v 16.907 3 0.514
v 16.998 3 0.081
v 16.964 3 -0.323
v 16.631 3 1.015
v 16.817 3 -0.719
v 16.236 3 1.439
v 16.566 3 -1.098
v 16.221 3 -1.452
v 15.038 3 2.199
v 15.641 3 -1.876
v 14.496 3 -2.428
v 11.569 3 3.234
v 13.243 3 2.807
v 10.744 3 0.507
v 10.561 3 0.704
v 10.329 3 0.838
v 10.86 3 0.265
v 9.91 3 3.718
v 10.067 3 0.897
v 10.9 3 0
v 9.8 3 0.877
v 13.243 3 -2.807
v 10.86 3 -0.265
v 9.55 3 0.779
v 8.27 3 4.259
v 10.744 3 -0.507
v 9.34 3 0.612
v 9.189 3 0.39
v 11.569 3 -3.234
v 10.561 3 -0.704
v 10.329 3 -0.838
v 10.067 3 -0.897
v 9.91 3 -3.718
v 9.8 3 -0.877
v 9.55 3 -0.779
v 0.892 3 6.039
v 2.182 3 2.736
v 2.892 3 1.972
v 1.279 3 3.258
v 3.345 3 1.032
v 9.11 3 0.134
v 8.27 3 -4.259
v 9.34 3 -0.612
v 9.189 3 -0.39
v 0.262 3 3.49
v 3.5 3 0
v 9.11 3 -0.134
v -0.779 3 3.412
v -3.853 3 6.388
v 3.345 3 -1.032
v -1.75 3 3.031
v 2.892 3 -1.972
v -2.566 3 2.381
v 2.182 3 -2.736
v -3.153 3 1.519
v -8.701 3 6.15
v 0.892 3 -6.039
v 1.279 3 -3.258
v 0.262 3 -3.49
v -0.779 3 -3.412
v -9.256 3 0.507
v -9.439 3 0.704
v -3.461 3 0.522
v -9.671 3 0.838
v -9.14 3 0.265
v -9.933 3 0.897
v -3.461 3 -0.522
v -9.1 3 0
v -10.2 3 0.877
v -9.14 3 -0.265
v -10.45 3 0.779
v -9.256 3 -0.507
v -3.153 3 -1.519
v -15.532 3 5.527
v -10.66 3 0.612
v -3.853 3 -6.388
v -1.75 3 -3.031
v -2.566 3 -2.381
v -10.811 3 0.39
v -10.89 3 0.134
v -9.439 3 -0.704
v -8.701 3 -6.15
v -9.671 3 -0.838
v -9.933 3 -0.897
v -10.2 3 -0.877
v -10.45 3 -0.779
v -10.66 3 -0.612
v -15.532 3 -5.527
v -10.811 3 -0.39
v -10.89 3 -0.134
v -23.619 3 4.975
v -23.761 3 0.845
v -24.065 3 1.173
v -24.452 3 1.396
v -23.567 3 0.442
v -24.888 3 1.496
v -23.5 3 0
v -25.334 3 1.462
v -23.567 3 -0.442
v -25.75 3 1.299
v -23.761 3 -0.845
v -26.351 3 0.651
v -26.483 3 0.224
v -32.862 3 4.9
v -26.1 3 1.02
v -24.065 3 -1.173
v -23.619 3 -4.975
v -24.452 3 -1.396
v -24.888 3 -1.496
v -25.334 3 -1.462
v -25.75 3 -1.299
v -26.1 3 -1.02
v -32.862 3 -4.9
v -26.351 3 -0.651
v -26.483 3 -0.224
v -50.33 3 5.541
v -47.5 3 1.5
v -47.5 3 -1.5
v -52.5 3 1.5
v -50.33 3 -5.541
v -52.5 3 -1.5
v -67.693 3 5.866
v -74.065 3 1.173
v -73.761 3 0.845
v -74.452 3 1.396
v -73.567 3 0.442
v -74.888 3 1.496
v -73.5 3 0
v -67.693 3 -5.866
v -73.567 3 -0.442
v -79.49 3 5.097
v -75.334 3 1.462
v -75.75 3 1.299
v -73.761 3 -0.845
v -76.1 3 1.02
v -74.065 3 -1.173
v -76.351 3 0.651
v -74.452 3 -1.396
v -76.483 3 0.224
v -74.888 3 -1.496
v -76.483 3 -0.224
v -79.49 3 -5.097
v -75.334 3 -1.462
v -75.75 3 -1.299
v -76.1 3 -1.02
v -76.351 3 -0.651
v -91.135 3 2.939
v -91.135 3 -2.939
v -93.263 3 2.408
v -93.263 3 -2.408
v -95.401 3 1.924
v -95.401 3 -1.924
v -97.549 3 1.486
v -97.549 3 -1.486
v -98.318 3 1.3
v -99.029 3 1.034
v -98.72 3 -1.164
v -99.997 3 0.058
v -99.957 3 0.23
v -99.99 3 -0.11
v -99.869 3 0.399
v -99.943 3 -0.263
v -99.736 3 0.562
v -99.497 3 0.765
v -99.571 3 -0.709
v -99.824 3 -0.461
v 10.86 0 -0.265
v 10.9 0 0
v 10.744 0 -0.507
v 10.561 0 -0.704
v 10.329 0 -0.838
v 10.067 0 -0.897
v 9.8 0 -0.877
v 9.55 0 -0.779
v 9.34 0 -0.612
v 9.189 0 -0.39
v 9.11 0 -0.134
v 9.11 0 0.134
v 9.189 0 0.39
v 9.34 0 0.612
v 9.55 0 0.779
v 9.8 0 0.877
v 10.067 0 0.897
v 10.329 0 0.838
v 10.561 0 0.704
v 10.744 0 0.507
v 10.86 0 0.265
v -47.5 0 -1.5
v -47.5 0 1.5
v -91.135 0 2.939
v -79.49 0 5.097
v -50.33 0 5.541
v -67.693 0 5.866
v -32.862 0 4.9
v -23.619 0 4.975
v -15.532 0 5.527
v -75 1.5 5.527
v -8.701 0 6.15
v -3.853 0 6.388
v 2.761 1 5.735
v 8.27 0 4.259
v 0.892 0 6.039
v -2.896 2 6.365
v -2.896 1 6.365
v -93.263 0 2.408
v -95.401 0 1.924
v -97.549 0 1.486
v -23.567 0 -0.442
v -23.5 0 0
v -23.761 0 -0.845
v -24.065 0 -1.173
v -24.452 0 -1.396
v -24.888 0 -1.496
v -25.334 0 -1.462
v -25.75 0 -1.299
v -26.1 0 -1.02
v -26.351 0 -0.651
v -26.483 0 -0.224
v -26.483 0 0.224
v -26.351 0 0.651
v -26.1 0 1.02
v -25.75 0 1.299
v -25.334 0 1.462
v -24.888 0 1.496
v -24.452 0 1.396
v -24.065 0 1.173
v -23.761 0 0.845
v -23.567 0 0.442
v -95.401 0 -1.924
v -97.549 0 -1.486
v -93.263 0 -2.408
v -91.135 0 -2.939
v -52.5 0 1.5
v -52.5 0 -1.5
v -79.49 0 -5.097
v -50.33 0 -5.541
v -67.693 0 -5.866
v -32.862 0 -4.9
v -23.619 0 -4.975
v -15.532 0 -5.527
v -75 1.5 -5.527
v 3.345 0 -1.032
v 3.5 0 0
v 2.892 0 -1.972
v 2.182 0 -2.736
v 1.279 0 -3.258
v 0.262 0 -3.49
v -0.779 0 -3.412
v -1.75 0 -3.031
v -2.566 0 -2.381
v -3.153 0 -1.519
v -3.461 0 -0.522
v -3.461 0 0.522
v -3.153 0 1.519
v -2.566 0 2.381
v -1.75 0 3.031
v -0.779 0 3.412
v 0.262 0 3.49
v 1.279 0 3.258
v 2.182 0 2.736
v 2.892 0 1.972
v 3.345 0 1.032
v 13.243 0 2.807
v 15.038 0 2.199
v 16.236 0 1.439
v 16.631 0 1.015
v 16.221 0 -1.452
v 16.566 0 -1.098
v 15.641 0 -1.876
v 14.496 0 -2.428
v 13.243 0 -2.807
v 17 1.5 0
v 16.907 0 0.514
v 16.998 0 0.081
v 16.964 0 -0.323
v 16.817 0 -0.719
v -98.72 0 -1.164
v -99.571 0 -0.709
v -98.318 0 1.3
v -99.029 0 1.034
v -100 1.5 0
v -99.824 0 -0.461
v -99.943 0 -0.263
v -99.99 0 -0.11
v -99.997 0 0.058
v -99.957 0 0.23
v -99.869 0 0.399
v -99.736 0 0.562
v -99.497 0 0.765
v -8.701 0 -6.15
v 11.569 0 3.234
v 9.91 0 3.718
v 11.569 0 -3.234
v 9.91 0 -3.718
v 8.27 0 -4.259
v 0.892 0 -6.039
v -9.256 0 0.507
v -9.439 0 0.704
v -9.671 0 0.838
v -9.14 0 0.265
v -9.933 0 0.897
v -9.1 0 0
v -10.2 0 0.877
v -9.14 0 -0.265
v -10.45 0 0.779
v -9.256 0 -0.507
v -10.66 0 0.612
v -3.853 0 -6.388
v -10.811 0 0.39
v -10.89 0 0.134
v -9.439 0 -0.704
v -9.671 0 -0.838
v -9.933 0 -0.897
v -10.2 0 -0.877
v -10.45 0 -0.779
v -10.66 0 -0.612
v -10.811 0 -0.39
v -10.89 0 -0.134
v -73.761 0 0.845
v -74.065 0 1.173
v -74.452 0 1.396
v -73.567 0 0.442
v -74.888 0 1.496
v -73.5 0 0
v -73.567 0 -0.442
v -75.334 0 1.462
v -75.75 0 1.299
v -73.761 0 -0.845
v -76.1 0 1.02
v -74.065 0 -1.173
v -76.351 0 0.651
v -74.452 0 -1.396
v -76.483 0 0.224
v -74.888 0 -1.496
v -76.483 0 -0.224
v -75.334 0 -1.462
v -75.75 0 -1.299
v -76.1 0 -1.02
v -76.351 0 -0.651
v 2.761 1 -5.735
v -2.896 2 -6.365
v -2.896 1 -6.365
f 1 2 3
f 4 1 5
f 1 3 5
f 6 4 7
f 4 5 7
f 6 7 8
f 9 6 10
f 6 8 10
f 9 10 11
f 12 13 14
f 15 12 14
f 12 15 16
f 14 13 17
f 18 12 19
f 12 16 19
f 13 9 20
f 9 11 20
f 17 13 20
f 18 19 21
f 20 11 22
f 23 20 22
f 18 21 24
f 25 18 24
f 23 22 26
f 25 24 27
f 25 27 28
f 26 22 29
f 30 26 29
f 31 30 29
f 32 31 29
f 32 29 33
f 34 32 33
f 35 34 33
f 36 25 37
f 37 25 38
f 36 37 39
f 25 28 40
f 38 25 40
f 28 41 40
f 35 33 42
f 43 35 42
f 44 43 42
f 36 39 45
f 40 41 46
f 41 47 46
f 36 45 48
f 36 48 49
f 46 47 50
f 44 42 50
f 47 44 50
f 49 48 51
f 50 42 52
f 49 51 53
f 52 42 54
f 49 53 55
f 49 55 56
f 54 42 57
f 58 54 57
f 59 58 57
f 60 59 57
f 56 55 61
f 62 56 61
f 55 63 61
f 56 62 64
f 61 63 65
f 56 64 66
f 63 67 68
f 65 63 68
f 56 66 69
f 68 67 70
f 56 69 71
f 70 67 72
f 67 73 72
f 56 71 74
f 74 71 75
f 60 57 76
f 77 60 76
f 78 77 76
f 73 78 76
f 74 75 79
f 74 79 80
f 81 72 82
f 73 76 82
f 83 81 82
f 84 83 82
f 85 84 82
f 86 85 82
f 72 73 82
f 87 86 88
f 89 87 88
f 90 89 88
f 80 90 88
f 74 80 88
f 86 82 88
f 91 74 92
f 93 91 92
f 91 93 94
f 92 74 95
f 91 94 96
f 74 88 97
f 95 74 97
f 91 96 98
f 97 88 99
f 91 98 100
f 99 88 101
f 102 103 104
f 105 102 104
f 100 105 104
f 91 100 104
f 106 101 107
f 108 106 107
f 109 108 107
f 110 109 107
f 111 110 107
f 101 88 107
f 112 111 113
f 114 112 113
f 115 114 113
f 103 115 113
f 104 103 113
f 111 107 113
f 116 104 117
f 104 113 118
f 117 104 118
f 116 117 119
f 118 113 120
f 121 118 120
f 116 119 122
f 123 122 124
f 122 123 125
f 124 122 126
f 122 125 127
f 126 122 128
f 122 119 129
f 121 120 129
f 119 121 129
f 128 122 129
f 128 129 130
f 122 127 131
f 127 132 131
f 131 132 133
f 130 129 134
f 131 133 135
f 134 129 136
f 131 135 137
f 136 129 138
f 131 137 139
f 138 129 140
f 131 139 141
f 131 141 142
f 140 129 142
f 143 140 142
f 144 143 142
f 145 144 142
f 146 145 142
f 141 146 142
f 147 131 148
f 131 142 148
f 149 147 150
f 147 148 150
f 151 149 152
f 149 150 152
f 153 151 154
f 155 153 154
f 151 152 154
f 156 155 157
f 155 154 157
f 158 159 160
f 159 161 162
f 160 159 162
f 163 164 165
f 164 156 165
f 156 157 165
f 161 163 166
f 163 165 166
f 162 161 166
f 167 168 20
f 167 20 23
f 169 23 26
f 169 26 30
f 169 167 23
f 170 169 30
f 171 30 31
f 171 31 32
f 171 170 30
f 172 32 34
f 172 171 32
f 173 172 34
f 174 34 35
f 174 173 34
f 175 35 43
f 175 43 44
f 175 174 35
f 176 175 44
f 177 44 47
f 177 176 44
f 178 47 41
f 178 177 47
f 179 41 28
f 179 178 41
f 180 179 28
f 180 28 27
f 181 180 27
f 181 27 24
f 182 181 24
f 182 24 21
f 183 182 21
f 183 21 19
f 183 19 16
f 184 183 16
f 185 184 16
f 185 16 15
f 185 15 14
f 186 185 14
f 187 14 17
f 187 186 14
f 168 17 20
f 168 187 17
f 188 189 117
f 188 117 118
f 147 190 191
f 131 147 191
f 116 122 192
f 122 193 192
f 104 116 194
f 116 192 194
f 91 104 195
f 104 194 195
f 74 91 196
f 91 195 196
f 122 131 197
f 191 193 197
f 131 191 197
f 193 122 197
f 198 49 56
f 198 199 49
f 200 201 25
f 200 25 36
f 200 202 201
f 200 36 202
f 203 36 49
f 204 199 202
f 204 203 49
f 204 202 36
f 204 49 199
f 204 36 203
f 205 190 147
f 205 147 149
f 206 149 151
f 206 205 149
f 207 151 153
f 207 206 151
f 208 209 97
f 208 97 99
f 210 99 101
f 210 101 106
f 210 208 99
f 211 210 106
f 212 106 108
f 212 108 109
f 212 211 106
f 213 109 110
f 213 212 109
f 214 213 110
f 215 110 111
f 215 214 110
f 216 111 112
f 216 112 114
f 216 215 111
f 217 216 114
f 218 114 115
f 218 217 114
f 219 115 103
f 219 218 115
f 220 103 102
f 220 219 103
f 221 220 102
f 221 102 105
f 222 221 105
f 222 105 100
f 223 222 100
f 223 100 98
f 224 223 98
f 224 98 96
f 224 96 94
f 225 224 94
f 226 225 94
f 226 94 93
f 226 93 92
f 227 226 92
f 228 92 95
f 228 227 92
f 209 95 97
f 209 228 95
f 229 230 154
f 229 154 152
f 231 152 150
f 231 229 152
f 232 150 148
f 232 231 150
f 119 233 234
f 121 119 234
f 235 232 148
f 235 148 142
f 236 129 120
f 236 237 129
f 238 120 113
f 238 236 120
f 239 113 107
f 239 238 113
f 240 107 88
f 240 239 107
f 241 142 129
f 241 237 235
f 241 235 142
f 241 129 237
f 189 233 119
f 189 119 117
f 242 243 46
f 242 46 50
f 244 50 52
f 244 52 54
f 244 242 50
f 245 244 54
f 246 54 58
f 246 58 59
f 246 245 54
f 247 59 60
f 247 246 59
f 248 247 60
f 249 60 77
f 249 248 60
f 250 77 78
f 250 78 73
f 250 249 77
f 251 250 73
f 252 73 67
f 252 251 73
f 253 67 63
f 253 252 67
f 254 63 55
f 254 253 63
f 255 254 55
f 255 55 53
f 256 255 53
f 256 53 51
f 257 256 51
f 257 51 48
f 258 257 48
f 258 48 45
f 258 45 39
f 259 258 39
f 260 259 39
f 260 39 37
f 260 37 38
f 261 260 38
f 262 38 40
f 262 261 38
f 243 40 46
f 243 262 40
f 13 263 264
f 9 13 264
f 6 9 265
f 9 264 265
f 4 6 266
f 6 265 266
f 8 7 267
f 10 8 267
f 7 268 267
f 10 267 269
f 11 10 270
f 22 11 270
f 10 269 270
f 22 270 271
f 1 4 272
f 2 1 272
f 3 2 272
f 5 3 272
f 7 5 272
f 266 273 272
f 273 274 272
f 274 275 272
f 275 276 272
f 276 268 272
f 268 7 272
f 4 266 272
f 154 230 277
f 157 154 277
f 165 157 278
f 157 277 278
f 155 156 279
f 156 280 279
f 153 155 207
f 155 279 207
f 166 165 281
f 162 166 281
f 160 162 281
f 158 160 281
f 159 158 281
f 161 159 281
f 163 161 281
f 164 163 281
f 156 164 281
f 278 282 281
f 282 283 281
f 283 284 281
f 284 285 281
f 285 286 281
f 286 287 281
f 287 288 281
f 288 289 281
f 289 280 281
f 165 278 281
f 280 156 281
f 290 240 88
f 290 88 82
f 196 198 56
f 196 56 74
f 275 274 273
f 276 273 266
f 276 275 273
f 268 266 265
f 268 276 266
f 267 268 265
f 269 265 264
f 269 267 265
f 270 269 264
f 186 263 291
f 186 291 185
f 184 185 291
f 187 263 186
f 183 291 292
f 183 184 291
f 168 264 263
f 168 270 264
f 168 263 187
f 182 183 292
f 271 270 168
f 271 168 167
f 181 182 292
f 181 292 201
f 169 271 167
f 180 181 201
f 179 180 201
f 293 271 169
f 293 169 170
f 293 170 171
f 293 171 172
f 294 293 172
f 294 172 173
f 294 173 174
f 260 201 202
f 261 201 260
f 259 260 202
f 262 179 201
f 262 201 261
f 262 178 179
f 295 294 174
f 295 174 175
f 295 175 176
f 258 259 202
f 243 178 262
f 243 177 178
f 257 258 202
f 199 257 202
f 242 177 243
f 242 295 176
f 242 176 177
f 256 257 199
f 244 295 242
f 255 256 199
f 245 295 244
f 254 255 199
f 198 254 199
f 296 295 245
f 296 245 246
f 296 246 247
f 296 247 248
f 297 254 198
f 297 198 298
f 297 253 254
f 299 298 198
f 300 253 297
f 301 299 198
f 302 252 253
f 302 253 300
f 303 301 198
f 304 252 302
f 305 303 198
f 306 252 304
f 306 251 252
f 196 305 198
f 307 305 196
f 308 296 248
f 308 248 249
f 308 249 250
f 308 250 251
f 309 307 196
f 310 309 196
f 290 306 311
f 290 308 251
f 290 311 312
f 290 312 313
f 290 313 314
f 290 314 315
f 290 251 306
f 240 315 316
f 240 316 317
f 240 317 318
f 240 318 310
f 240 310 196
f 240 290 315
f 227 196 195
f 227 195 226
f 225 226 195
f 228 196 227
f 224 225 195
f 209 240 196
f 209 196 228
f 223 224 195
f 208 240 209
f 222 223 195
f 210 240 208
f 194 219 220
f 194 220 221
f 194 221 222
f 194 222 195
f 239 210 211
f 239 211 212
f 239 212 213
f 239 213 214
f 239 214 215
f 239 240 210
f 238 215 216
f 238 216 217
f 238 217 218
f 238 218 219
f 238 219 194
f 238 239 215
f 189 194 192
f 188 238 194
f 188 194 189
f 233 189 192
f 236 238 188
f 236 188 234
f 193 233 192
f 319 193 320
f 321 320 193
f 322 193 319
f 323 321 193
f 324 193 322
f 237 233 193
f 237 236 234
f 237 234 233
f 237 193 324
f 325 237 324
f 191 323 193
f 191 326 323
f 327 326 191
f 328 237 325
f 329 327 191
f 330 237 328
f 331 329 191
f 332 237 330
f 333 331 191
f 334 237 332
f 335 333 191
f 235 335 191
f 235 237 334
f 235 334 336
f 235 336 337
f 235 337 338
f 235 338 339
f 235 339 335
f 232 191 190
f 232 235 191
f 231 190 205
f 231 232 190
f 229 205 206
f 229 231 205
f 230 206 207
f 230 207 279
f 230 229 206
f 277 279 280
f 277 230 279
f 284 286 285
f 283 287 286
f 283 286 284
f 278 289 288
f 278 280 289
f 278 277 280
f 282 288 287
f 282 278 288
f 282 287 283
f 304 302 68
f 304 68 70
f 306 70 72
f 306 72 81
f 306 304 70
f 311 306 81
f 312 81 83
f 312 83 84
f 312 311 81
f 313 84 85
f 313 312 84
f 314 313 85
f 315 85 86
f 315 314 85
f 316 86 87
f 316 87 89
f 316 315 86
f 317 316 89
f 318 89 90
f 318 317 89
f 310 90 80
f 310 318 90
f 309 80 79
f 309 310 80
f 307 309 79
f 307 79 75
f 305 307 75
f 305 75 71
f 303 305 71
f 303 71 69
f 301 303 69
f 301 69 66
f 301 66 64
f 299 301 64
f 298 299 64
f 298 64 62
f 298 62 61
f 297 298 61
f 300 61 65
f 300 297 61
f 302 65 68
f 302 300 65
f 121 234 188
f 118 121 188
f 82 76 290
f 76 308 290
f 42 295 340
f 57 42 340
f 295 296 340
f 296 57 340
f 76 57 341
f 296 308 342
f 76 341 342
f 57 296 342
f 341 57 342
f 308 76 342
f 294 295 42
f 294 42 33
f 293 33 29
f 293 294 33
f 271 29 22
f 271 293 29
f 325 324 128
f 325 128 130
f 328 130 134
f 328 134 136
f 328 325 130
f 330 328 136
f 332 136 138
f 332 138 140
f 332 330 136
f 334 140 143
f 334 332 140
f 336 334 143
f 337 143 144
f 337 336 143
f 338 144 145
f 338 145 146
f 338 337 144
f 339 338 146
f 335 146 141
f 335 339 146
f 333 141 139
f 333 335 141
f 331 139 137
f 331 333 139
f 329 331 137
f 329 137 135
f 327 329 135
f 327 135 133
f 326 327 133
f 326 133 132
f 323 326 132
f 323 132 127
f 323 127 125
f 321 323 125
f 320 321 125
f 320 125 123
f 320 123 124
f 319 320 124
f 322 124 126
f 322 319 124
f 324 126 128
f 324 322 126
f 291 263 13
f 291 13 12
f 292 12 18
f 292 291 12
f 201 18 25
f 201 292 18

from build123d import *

# Parameters (mm, degrees)
ESBO_O1_R                = 3.5
ESBO_O1_R_2              = 0.9
ESBO_O1_R_3              = 1.5
ESBO_O1_W                = 5
ESBO_O1_H                = 3
RESSALTO_EXTRUS_O1_DEPTH = 3


with BuildPart() as part:
    # Esboço1 → Ressalto-extrusão1 (new body)
    with BuildSketch(Plane(origin=(0, 0, 0), x_dir=(1, 0, 0), z_dir=(0, 1, 0))):
        with BuildLine():
            Line((-15.5324261, 5.526900759), (-8.701477822, 6.15))
            add(Edge.make_bspline(
                [(8.269723742, 4.259468977), (2.834912713, 6.157347241), (-2.82215339, 6.787527354), (-8.701477822, 6.15)],
                knots=[0.35388944, 0.35388944, 0.35388944, 0.35388944, 1, 1, 1, 1], degree=3))
            ThreePointArc((8.269723742, 4.259468977), (10.737611567, 3.46879666), (13.24315076, 2.807051708))
            add(Edge.make_bspline(
                [(13.243153259, -2.80704963), (25.10877849, 2.12e-06), (13.24315076, 2.807051708)],
                knots=[5.194112275, 5.194112275, 5.194112275, 7.372258742, 7.372258742, 7.372258742], degree=2, weights=[1, 0.463306864, 1]))
            ThreePointArc((13.243153259, -2.80704963), (10.737612779, -3.468795552), (8.269723742, -4.259468977))
            add(Edge.make_bspline(
                [(8.269723742, -4.259468977), (2.834913243, -6.15734876), (-2.822153925, -6.787525817), (-8.701477822, -6.15)],
                knots=[0.35388944, 0.35388944, 0.35388944, 0.35388944, 1, 1, 1, 1], degree=3))
            Line((-8.701477822, -6.15), (-15.5324261, -5.526900759))
            add(Edge.make_bspline(
                [(-91.135478662, -2.939356415), (-85.814709071, -4.330378827), (-60.917561227, -7.97508816), (-35.132432713, -3.48955228), (-15.5324261, -5.526900759)],
                knots=[0.107974898, 0.107974898, 0.107974898, 0.107974898, 0.300967181, 1, 1, 1, 1], degree=3))
            ThreePointArc((-91.135478662, -2.939356415), (-94.330524557, -2.159963767), (-97.549471293, -1.486054958))
            add(Edge.make_bspline(
                [(-97.549471293, 1.486054958), (-105.279311729, 0), (-97.549471293, -1.486054958)],
                knots=[5.195092838, 5.195092838, 5.195092838, 7.371277776, 7.371277776, 7.371277776], degree=2, weights=[1, 0.464175793, 1]))
            ThreePointArc((-97.549471293, 1.486054958), (-94.330524557, 2.159963767), (-91.135478662, 2.939356415))
            add(Edge.make_bspline(
                [(-91.135478662, 2.939356415), (-85.814709071, 4.330378827), (-60.917561227, 7.97508816), (-35.132432713, 3.48955228), (-15.5324261, 5.526900759)],
                knots=[0.107974898, 0.107974898, 0.107974898, 0.107974898, 0.300967181, 1, 1, 1, 1], degree=3))
        make_face()
        Circle(ESBO_O1_R, mode=Mode.SUBTRACT)
        with Locations((10, 0)):
            Circle(ESBO_O1_R_2, mode=Mode.SUBTRACT)
        with Locations((-10, 0)):
            Circle(ESBO_O1_R_2, mode=Mode.SUBTRACT)
        with Locations((-25, 0)):
            Circle(ESBO_O1_R_3, mode=Mode.SUBTRACT)
        with Locations((-75, 0)):
            Circle(ESBO_O1_R_3, mode=Mode.SUBTRACT)
        with Locations((-50, 0)):
            Rectangle(ESBO_O1_W, ESBO_O1_H, mode=Mode.SUBTRACT)
    extrude(amount=RESSALTO_EXTRUS_O1_DEPTH)


solid = part.part
